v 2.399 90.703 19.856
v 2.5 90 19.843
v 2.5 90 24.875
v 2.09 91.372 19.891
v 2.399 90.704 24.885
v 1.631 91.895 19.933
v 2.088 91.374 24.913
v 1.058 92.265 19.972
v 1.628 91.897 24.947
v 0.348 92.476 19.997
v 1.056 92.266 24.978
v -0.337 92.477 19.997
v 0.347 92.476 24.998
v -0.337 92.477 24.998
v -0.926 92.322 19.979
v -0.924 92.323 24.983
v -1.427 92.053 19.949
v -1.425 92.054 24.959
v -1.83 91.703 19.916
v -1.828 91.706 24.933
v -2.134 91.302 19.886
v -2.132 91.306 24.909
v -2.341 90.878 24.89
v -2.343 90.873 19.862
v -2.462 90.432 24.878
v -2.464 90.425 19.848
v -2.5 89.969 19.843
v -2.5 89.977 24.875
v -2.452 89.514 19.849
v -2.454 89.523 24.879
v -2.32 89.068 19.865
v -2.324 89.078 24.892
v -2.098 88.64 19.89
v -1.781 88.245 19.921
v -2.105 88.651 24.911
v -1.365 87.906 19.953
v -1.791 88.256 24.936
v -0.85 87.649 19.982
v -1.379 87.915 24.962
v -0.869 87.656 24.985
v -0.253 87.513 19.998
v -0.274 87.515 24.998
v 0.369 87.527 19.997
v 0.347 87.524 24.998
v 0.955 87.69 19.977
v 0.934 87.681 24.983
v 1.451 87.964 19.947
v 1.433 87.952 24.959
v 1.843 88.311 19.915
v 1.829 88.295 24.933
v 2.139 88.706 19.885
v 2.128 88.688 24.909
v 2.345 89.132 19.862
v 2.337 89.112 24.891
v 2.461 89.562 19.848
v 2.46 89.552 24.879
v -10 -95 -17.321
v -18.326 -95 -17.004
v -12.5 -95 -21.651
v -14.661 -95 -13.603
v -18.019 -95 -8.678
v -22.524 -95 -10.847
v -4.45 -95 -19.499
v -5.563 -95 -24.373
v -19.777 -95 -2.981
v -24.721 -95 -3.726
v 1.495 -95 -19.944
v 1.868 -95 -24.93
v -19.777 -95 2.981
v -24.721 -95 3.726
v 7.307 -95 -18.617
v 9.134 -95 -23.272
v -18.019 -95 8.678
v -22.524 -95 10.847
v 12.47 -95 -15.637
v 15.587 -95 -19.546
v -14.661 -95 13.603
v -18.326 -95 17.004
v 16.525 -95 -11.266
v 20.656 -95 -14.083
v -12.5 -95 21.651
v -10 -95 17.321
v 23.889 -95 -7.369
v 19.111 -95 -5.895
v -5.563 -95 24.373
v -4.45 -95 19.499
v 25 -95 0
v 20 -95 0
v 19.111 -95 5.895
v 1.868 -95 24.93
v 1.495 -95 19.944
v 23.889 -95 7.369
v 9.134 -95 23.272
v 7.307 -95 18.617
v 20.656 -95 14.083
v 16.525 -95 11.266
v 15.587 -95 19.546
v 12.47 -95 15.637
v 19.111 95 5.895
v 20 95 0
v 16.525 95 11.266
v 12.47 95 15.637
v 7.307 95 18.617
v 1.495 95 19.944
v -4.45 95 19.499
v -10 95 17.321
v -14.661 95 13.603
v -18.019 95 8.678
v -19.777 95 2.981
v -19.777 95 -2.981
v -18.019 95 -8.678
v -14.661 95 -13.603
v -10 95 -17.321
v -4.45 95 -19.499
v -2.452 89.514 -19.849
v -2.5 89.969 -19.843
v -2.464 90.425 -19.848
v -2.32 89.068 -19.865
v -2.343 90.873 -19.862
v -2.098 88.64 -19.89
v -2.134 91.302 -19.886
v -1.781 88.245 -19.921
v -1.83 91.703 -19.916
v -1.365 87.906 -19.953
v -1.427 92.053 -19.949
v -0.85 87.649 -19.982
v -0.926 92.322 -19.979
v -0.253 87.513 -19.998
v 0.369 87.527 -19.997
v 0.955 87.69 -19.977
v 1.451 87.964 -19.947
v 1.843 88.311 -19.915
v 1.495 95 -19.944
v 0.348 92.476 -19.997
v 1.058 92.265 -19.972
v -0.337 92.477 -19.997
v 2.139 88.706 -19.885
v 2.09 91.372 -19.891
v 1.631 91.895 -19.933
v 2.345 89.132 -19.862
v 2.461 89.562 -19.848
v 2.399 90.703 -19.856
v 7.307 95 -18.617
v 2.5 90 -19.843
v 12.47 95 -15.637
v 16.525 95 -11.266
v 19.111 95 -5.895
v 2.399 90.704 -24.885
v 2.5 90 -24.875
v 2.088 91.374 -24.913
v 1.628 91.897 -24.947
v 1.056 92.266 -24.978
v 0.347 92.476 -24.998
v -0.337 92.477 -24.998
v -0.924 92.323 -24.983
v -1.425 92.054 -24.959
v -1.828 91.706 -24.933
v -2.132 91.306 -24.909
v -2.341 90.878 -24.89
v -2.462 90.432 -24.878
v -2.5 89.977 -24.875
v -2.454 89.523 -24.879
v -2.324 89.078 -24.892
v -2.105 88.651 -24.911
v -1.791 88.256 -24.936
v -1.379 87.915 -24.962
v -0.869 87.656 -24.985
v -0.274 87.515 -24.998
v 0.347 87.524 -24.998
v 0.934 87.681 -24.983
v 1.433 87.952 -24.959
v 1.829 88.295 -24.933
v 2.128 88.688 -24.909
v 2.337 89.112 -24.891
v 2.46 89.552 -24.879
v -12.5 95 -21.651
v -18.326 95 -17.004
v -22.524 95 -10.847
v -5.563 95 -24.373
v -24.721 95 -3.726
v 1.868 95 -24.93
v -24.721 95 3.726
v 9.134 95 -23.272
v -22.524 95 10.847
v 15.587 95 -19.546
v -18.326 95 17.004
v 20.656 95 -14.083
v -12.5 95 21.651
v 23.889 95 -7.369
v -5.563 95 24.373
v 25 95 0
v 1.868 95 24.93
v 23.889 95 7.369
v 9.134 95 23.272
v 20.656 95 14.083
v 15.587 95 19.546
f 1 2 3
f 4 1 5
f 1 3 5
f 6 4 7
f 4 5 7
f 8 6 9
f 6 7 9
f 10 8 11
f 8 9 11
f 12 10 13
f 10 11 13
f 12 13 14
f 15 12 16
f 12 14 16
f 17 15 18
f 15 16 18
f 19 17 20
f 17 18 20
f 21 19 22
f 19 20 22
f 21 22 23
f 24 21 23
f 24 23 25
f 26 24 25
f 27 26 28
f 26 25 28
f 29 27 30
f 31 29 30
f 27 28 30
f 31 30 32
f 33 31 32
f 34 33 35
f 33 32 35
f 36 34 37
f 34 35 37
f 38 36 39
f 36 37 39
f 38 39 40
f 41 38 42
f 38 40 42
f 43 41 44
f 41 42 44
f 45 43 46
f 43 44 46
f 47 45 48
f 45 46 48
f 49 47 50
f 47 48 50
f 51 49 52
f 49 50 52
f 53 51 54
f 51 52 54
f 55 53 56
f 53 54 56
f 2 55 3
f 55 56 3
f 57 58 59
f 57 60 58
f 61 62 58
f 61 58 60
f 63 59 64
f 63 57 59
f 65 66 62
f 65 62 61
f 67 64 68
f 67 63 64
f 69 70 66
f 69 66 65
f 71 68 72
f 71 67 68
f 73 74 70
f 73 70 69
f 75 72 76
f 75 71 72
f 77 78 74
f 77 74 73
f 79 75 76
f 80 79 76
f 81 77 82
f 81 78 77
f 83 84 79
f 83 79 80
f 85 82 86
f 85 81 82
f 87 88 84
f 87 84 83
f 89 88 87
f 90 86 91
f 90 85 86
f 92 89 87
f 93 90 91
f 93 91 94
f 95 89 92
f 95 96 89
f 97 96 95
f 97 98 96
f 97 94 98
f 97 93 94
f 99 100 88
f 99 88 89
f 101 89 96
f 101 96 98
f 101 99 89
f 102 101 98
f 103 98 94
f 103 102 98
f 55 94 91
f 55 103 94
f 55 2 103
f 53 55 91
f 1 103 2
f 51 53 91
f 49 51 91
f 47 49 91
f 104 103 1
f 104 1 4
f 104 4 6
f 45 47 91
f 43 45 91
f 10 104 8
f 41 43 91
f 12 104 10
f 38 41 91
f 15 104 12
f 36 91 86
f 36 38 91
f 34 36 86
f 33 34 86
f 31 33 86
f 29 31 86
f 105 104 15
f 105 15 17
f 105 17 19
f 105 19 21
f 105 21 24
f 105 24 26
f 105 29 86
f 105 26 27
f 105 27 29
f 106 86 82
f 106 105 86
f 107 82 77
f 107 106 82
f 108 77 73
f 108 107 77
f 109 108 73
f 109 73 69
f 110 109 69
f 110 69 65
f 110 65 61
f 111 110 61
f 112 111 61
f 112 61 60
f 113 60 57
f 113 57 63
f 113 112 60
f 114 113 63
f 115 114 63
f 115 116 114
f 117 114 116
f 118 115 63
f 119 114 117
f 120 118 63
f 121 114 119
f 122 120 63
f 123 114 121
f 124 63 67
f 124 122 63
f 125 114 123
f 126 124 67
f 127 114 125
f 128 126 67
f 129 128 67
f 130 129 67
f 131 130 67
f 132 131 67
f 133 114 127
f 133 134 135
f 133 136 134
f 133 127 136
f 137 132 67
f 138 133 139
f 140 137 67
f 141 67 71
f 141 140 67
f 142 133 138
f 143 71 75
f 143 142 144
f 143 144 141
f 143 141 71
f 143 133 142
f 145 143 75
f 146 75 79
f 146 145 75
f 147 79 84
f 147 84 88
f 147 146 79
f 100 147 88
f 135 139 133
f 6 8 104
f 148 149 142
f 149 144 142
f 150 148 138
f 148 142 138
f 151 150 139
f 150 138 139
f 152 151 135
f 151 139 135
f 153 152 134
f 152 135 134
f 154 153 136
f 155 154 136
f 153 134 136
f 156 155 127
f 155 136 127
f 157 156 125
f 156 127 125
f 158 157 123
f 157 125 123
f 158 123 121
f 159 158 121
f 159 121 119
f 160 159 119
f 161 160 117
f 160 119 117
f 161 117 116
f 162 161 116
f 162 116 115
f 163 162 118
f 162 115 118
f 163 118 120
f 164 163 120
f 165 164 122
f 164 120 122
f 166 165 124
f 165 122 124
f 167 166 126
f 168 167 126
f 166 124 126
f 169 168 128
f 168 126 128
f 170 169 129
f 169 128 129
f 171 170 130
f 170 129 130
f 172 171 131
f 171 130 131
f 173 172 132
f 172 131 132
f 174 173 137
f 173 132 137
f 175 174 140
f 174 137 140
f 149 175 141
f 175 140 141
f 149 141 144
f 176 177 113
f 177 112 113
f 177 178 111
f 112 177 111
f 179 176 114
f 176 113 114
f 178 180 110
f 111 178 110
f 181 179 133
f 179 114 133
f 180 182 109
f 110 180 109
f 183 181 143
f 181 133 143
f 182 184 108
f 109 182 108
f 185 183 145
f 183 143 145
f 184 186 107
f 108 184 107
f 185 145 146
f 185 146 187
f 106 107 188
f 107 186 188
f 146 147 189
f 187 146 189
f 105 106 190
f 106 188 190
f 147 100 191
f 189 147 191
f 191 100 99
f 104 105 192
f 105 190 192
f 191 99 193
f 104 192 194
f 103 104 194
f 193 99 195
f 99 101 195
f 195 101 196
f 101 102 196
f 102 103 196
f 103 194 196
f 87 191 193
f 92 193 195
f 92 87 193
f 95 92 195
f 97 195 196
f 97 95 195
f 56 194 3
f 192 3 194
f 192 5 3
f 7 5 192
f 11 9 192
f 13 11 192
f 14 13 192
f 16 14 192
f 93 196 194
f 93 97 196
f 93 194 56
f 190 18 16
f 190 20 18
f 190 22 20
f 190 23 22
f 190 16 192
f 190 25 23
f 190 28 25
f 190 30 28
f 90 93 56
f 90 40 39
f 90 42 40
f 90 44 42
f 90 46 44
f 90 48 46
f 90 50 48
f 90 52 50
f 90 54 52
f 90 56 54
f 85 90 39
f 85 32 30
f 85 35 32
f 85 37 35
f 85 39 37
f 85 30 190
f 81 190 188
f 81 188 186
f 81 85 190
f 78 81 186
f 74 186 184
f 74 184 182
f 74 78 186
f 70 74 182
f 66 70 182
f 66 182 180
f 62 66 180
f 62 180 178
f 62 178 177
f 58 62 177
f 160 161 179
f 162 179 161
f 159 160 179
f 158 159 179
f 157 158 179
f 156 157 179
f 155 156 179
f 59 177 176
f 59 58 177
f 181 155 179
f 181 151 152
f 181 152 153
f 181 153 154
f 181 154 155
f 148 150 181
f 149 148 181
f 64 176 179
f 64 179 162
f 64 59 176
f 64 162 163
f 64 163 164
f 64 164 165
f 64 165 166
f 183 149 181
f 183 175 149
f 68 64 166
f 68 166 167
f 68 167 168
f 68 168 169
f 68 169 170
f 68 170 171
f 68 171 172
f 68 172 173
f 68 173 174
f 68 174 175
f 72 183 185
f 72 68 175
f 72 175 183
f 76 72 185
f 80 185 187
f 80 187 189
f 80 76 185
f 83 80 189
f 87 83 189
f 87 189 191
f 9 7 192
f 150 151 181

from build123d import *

# Parameters (mm, degrees)
SKETCH001_R  = 2.5
PAD001_DEPTH = 30
SKETCH_R     = 25
SKETCH_R_2   = 20
PAD_DEPTH    = 95


with BuildPart() as pad001:
    # Sketch001 → Pad001 (new body, symmetric)
    with BuildSketch(Plane.XY):
        with Locations((0, 90)):
            Circle(SKETCH001_R)
    extrude(amount=PAD001_DEPTH, both=True)


with BuildPart() as cut:
    # Sketch → Pad (new body, symmetric)
    with BuildSketch(Plane.XZ):
        Circle(SKETCH_R)
        Circle(SKETCH_R_2, mode=Mode.SUBTRACT)
    extrude(amount=PAD_DEPTH, both=True)

    # Cut: cut Pad001
    add(pad001.part, mode=Mode.SUBTRACT)


solid = cut.part
